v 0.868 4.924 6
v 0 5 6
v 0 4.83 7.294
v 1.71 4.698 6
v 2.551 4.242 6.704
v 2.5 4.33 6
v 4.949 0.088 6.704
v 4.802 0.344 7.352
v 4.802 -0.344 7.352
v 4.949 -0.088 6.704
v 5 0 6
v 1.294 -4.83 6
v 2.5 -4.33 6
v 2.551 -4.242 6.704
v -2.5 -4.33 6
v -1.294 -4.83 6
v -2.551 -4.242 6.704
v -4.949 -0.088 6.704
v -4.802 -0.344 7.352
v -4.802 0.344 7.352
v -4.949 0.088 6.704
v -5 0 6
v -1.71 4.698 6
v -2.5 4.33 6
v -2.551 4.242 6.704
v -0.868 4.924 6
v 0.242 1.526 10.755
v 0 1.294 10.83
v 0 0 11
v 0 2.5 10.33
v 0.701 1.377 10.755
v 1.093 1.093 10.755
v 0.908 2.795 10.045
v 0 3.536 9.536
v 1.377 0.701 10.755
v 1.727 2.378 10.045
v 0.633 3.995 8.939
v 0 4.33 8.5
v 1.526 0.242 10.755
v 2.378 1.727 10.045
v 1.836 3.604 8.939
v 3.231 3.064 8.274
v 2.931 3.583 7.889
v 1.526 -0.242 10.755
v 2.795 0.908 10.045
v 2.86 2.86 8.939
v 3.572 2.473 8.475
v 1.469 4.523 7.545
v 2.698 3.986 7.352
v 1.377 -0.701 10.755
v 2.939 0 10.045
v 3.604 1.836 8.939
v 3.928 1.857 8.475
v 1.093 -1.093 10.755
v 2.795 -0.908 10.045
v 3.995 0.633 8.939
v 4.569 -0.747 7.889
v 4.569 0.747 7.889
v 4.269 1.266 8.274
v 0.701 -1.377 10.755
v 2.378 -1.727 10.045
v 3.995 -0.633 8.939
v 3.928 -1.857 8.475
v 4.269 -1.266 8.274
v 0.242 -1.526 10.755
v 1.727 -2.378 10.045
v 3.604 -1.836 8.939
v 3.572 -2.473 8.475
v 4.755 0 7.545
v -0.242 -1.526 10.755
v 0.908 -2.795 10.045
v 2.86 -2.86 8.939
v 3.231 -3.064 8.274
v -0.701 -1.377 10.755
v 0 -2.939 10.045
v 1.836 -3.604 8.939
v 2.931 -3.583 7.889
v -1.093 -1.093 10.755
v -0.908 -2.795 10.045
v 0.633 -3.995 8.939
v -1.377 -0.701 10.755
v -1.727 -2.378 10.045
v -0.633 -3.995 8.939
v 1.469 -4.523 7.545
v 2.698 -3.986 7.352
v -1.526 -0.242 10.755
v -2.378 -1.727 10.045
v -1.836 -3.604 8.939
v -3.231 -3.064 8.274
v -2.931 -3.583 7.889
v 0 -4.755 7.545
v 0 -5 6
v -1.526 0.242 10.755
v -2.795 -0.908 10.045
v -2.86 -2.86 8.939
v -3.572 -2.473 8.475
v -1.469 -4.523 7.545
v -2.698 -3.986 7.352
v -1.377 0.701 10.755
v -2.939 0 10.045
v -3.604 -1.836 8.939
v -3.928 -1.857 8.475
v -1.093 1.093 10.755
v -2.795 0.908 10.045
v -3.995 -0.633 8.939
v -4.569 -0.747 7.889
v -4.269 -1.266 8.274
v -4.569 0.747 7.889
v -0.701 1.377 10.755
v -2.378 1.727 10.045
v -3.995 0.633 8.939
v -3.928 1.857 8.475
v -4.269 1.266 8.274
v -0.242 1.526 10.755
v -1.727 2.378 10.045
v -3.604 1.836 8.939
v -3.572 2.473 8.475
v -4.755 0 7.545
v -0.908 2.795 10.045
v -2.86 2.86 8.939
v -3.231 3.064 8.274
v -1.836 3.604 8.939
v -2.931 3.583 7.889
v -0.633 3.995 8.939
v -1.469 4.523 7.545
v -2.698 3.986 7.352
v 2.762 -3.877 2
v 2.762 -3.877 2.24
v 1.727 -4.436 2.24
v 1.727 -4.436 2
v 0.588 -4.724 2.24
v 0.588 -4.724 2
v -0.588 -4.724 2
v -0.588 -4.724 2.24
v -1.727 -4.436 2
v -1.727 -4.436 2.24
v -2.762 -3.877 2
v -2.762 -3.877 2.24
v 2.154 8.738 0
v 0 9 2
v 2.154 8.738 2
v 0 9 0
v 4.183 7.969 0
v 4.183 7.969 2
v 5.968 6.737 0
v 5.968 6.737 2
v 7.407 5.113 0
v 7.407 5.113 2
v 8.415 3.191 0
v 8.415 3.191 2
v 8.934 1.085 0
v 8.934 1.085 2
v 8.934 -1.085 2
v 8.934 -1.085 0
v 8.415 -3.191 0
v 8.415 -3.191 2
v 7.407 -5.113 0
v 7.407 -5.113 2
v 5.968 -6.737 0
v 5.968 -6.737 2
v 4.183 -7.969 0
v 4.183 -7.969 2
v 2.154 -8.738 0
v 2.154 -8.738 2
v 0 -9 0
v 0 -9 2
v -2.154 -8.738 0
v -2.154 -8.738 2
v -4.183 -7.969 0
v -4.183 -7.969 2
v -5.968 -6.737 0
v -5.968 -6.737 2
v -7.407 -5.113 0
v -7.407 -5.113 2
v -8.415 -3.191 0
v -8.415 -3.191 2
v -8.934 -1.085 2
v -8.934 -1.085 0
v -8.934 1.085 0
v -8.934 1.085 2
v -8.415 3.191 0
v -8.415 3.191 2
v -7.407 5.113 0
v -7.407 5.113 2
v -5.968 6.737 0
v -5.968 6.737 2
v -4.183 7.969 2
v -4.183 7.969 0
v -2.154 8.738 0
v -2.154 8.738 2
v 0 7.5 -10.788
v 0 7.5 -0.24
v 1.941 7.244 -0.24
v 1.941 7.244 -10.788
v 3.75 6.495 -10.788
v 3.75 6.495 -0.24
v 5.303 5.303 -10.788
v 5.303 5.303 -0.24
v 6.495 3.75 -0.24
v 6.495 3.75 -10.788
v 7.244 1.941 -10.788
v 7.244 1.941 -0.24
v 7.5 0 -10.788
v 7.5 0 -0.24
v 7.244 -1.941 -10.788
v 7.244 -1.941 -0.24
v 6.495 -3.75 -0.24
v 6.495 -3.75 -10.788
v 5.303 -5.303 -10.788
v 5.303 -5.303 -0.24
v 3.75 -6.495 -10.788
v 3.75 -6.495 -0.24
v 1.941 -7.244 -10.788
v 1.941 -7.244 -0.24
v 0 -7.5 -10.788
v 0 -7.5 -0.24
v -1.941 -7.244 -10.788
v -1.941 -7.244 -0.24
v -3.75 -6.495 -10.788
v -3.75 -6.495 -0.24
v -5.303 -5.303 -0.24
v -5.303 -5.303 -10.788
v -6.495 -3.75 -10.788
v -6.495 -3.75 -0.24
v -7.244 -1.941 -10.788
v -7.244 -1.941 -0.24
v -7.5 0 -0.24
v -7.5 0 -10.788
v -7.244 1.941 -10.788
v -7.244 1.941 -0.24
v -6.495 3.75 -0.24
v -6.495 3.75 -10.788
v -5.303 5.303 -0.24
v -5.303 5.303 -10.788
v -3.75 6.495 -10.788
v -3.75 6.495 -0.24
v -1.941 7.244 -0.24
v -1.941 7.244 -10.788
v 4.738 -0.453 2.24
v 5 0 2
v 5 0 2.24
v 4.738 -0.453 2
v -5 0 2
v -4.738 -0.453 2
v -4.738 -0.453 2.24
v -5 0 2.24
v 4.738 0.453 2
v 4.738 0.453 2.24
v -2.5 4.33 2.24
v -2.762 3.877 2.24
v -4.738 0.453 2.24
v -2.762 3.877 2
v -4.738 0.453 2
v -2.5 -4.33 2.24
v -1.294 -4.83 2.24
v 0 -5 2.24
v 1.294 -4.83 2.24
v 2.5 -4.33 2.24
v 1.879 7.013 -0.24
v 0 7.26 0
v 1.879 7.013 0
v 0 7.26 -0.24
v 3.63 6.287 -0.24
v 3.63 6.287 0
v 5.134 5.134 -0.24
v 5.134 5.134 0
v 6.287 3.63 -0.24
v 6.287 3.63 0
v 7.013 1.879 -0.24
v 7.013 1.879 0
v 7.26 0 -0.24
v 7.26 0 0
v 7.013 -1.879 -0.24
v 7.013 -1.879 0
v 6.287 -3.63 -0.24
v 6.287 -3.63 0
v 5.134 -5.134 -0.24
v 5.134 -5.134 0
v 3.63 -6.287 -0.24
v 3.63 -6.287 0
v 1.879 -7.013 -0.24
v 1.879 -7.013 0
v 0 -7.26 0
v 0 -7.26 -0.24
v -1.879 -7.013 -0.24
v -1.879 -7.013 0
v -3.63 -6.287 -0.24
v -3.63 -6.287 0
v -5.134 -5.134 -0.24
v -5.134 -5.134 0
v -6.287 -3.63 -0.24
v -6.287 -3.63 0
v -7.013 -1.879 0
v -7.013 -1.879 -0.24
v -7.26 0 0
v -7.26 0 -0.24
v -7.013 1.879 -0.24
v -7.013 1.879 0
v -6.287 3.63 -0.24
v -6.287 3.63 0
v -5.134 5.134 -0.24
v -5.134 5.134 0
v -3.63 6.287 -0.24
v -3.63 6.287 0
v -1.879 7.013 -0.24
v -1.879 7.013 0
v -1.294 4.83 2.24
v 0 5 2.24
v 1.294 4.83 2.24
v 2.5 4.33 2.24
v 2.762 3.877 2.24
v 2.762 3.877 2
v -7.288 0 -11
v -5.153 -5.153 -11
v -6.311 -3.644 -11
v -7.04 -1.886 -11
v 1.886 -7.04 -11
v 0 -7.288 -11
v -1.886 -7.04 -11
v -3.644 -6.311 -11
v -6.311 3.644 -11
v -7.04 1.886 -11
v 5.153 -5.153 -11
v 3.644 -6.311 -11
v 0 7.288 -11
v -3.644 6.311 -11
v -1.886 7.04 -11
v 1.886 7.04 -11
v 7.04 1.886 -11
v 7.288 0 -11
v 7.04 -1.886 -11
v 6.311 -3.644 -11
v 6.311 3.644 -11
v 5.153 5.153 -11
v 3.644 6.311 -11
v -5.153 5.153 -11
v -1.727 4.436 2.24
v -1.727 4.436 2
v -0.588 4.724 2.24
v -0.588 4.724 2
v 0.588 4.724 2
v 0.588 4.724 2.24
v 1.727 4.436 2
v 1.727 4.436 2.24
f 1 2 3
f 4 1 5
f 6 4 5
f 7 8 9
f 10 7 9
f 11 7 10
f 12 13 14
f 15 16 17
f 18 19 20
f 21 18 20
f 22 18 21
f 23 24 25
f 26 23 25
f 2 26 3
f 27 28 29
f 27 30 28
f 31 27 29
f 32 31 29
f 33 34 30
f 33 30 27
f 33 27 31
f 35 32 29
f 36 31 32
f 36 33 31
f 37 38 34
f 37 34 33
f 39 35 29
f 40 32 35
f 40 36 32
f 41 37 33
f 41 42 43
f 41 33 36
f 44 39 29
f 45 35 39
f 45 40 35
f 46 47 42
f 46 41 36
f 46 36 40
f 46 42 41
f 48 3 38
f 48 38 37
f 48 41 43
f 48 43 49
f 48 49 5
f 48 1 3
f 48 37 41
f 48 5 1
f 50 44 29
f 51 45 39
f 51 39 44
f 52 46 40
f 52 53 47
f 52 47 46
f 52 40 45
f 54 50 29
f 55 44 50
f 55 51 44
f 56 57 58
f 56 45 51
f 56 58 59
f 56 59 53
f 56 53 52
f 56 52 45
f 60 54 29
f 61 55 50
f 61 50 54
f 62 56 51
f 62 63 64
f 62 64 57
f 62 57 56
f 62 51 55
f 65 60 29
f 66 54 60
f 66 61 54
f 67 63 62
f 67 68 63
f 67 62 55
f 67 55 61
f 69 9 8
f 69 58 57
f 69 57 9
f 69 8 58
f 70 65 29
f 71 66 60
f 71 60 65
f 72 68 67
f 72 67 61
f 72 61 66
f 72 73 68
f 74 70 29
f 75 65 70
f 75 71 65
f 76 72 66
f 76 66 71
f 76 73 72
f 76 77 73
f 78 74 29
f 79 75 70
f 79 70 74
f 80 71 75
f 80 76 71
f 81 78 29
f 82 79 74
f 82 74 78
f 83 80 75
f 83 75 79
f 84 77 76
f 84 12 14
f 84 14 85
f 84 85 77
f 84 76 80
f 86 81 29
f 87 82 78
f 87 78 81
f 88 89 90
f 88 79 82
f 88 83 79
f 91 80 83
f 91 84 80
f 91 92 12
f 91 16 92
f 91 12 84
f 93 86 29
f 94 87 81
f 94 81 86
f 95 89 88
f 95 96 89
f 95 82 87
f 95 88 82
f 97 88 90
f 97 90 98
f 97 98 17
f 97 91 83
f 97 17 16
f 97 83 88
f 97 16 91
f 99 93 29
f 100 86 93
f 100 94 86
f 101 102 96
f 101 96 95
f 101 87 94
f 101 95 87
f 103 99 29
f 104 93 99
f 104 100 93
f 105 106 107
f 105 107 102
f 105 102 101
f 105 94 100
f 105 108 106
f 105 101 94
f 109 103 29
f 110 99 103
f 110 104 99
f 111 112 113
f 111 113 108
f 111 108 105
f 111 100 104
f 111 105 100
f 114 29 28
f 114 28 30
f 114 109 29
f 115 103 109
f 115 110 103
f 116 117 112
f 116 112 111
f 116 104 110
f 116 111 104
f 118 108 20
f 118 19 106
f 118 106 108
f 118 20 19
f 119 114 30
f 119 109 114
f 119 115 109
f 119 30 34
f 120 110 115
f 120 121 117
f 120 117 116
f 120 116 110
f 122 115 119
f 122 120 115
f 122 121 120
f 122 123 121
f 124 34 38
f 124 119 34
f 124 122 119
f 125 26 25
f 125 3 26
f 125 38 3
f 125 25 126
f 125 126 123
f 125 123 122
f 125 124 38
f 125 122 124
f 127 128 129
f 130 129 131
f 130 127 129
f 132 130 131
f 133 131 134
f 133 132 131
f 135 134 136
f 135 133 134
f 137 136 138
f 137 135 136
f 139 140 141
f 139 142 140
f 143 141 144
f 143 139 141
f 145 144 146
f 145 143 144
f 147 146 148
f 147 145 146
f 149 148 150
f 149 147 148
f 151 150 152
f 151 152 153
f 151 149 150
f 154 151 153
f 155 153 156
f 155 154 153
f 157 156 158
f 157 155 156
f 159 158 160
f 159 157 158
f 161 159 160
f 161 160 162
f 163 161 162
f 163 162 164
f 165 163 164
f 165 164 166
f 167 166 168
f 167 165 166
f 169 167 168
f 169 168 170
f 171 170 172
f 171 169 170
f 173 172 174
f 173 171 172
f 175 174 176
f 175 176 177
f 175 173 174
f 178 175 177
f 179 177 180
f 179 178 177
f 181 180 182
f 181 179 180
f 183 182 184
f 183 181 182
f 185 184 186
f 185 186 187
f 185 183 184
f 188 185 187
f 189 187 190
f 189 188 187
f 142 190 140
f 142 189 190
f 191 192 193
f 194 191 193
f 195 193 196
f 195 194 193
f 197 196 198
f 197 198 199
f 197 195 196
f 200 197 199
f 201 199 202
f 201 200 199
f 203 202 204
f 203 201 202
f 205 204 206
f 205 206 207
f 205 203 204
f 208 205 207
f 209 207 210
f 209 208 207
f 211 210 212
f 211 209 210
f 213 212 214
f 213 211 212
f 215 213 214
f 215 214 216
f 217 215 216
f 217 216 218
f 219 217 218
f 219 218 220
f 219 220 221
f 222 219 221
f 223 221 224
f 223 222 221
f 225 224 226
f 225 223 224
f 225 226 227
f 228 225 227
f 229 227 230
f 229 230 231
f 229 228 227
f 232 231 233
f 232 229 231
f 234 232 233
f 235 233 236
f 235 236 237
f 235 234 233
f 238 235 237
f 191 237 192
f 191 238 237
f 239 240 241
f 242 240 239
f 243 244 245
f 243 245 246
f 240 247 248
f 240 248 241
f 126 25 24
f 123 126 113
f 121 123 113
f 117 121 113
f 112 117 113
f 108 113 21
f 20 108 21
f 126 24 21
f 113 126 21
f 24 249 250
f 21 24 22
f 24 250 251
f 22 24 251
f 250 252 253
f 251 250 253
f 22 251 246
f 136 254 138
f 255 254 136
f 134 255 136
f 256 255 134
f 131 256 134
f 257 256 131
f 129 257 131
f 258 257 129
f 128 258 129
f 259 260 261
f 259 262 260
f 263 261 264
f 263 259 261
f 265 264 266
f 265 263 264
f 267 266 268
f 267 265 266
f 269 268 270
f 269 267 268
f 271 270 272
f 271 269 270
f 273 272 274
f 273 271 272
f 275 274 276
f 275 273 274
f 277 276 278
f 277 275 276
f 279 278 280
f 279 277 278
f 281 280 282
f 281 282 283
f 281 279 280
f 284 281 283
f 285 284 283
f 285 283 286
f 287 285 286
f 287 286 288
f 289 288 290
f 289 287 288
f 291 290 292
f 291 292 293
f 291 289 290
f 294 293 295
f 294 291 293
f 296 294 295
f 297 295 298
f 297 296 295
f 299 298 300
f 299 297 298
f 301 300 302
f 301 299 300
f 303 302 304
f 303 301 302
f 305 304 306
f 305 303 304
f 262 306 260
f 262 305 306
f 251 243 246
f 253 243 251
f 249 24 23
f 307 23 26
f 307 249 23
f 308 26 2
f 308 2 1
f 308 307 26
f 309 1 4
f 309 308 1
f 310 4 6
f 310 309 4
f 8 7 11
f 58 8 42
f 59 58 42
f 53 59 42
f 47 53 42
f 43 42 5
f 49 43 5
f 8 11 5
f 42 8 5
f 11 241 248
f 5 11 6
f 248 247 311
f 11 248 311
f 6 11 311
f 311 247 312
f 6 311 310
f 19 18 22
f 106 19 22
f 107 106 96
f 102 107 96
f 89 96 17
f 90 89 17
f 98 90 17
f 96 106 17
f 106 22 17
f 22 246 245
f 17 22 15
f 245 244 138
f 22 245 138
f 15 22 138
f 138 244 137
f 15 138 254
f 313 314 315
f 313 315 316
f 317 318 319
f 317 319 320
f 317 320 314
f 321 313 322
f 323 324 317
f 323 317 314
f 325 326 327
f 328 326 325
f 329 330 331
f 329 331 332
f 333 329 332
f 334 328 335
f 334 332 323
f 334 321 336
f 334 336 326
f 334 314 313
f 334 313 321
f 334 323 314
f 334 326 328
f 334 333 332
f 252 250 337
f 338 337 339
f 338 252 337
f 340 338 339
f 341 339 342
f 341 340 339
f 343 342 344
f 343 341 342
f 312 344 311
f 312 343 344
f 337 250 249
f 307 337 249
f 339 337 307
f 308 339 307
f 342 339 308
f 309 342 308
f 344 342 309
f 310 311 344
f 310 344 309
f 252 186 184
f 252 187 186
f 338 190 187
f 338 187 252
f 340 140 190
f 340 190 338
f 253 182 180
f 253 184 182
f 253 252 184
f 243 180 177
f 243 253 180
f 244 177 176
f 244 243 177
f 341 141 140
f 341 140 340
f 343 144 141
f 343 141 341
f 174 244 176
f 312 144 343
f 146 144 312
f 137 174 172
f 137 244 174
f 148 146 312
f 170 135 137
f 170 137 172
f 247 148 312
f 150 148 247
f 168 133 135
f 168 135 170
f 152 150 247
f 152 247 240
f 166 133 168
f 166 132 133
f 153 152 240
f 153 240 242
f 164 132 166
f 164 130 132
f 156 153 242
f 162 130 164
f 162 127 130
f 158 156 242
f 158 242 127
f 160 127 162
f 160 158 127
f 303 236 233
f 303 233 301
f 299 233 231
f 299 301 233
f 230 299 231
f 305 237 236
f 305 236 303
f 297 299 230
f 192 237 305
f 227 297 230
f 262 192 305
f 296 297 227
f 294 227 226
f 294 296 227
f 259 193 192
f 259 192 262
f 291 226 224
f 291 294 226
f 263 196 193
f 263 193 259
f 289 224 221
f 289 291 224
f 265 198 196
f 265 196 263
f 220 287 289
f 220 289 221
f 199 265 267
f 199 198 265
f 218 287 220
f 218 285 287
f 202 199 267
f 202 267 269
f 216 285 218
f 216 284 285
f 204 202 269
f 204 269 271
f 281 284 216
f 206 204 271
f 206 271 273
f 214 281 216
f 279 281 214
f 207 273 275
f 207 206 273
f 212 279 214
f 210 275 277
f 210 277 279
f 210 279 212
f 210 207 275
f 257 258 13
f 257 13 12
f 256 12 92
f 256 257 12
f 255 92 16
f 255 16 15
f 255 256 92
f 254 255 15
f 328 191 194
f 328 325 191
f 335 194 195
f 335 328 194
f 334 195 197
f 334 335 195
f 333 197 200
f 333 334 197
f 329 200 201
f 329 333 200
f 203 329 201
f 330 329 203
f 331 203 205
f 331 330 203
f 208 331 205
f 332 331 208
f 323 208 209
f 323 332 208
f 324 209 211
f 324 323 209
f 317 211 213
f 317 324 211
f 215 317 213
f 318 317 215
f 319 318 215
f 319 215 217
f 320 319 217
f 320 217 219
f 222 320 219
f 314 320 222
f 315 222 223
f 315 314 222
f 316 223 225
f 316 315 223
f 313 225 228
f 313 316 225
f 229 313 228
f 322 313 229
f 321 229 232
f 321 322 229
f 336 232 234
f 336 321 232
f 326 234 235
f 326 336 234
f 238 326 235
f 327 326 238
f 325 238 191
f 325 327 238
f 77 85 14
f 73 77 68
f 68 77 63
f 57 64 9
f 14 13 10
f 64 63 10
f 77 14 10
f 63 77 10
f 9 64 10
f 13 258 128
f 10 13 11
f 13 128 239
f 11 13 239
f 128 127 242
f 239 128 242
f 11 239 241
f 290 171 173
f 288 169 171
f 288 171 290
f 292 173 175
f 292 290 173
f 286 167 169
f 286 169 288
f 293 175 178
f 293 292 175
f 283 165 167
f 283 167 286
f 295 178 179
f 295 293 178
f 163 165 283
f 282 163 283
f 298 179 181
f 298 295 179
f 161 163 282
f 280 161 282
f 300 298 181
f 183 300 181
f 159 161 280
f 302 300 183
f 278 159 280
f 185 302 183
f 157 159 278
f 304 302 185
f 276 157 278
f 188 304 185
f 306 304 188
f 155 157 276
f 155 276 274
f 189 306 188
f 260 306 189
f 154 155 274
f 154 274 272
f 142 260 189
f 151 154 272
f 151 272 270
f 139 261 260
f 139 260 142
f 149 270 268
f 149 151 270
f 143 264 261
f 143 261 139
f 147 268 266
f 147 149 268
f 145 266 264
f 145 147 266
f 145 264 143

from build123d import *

# Parameters (mm, degrees)
SKETCH5_OUTSIDE_W   = 26.73
SKETCH5_OUTSIDE_H   = 26.73
CUT_EXTRUDE1_DEPTH  = 10
BOSS_EXTRUDE3_DEPTH = 0.24


with BuildPart() as part:
    # Sketch3 → Revolve1 (revolve)
    with BuildSketch(Plane(origin=(0, 0, 0), x_dir=(0, 0, -1), z_dir=(1, 0, 0))):
        with BuildLine():
            Line((-2, 5), (-2, 9))
            Line((-2, 9), (0, 9))
            Line((0, 9), (0, 7.5))
            Line((0, 7.5), (0, 7.26))
            Line((0, 7.26), (0.24, 7.26))
            Line((0.24, 7.26), (0.24, 7.5))
            Line((0.24, 7.5), (10.787867966, 7.5))
            Line((10.787867966, 7.5), (11, 7.287867966))
            Line((11, 7.287867966), (11, 0))
            Line((11, 0), (-11, 0))
            ThreePointArc((-11, 0), (-9.535533906, 3.535533906), (-6, 5))
            Line((-6, 5), (-2.24, 5))
            Line((-2.24, 5), (-2.24, 4.76))
            Line((-2.24, 4.76), (-2, 4.76))
            Line((-2, 4.76), (-2, 5))
        make_face()
    revolve(axis=Axis((0, 0, 11), (0, 0, -1)))

    # Sketch5 outside → Cut-Extrude1 (cut, through all)
    with BuildSketch(Plane.XY.offset(2)):
        Rectangle(SKETCH5_OUTSIDE_W, SKETCH5_OUTSIDE_H)
        with BuildLine():
            Line((-5, 0), (-2.5, -4.330127019))
            ThreePointArc((-2.5, -4.330127019), (0, -5), (2.5, -4.330127019))
            Line((2.5, -4.330127019), (5, 0))
            Line((5, 0), (2.5, 4.330127019))
            ThreePointArc((2.5, 4.330127019), (0, 5), (-2.5, 4.330127019))
            Line((-2.5, 4.330127019), (-5, 0))
        make_face(mode=Mode.SUBTRACT)
    extrude(amount=CUT_EXTRUDE1_DEPTH, mode=Mode.SUBTRACT)

    # Sketch7 → Boss-Extrude3 (add)
    with BuildSketch(Plane.XY.offset(2)):
        with BuildLine():
            Line((-4.738382517, -0.453134773), (-5, 0))
            Line((-5, 0), (-4.738382517, 0.453134773))
            ThreePointArc((-4.738382517, 0.453134773), (-4.76, 0), (-4.738382517, -0.453134773))
        make_face()
        with BuildLine():
            Line((4.738382517, 0.453134773), (5, 0))
            Line((5, 0), (4.738382517, -0.453134773))
            ThreePointArc((4.738382517, -0.453134773), (4.76, 0), (4.738382517, 0.453134773))
        make_face()
    extrude(amount=BOSS_EXTRUDE3_DEPTH)


solid = part.part
